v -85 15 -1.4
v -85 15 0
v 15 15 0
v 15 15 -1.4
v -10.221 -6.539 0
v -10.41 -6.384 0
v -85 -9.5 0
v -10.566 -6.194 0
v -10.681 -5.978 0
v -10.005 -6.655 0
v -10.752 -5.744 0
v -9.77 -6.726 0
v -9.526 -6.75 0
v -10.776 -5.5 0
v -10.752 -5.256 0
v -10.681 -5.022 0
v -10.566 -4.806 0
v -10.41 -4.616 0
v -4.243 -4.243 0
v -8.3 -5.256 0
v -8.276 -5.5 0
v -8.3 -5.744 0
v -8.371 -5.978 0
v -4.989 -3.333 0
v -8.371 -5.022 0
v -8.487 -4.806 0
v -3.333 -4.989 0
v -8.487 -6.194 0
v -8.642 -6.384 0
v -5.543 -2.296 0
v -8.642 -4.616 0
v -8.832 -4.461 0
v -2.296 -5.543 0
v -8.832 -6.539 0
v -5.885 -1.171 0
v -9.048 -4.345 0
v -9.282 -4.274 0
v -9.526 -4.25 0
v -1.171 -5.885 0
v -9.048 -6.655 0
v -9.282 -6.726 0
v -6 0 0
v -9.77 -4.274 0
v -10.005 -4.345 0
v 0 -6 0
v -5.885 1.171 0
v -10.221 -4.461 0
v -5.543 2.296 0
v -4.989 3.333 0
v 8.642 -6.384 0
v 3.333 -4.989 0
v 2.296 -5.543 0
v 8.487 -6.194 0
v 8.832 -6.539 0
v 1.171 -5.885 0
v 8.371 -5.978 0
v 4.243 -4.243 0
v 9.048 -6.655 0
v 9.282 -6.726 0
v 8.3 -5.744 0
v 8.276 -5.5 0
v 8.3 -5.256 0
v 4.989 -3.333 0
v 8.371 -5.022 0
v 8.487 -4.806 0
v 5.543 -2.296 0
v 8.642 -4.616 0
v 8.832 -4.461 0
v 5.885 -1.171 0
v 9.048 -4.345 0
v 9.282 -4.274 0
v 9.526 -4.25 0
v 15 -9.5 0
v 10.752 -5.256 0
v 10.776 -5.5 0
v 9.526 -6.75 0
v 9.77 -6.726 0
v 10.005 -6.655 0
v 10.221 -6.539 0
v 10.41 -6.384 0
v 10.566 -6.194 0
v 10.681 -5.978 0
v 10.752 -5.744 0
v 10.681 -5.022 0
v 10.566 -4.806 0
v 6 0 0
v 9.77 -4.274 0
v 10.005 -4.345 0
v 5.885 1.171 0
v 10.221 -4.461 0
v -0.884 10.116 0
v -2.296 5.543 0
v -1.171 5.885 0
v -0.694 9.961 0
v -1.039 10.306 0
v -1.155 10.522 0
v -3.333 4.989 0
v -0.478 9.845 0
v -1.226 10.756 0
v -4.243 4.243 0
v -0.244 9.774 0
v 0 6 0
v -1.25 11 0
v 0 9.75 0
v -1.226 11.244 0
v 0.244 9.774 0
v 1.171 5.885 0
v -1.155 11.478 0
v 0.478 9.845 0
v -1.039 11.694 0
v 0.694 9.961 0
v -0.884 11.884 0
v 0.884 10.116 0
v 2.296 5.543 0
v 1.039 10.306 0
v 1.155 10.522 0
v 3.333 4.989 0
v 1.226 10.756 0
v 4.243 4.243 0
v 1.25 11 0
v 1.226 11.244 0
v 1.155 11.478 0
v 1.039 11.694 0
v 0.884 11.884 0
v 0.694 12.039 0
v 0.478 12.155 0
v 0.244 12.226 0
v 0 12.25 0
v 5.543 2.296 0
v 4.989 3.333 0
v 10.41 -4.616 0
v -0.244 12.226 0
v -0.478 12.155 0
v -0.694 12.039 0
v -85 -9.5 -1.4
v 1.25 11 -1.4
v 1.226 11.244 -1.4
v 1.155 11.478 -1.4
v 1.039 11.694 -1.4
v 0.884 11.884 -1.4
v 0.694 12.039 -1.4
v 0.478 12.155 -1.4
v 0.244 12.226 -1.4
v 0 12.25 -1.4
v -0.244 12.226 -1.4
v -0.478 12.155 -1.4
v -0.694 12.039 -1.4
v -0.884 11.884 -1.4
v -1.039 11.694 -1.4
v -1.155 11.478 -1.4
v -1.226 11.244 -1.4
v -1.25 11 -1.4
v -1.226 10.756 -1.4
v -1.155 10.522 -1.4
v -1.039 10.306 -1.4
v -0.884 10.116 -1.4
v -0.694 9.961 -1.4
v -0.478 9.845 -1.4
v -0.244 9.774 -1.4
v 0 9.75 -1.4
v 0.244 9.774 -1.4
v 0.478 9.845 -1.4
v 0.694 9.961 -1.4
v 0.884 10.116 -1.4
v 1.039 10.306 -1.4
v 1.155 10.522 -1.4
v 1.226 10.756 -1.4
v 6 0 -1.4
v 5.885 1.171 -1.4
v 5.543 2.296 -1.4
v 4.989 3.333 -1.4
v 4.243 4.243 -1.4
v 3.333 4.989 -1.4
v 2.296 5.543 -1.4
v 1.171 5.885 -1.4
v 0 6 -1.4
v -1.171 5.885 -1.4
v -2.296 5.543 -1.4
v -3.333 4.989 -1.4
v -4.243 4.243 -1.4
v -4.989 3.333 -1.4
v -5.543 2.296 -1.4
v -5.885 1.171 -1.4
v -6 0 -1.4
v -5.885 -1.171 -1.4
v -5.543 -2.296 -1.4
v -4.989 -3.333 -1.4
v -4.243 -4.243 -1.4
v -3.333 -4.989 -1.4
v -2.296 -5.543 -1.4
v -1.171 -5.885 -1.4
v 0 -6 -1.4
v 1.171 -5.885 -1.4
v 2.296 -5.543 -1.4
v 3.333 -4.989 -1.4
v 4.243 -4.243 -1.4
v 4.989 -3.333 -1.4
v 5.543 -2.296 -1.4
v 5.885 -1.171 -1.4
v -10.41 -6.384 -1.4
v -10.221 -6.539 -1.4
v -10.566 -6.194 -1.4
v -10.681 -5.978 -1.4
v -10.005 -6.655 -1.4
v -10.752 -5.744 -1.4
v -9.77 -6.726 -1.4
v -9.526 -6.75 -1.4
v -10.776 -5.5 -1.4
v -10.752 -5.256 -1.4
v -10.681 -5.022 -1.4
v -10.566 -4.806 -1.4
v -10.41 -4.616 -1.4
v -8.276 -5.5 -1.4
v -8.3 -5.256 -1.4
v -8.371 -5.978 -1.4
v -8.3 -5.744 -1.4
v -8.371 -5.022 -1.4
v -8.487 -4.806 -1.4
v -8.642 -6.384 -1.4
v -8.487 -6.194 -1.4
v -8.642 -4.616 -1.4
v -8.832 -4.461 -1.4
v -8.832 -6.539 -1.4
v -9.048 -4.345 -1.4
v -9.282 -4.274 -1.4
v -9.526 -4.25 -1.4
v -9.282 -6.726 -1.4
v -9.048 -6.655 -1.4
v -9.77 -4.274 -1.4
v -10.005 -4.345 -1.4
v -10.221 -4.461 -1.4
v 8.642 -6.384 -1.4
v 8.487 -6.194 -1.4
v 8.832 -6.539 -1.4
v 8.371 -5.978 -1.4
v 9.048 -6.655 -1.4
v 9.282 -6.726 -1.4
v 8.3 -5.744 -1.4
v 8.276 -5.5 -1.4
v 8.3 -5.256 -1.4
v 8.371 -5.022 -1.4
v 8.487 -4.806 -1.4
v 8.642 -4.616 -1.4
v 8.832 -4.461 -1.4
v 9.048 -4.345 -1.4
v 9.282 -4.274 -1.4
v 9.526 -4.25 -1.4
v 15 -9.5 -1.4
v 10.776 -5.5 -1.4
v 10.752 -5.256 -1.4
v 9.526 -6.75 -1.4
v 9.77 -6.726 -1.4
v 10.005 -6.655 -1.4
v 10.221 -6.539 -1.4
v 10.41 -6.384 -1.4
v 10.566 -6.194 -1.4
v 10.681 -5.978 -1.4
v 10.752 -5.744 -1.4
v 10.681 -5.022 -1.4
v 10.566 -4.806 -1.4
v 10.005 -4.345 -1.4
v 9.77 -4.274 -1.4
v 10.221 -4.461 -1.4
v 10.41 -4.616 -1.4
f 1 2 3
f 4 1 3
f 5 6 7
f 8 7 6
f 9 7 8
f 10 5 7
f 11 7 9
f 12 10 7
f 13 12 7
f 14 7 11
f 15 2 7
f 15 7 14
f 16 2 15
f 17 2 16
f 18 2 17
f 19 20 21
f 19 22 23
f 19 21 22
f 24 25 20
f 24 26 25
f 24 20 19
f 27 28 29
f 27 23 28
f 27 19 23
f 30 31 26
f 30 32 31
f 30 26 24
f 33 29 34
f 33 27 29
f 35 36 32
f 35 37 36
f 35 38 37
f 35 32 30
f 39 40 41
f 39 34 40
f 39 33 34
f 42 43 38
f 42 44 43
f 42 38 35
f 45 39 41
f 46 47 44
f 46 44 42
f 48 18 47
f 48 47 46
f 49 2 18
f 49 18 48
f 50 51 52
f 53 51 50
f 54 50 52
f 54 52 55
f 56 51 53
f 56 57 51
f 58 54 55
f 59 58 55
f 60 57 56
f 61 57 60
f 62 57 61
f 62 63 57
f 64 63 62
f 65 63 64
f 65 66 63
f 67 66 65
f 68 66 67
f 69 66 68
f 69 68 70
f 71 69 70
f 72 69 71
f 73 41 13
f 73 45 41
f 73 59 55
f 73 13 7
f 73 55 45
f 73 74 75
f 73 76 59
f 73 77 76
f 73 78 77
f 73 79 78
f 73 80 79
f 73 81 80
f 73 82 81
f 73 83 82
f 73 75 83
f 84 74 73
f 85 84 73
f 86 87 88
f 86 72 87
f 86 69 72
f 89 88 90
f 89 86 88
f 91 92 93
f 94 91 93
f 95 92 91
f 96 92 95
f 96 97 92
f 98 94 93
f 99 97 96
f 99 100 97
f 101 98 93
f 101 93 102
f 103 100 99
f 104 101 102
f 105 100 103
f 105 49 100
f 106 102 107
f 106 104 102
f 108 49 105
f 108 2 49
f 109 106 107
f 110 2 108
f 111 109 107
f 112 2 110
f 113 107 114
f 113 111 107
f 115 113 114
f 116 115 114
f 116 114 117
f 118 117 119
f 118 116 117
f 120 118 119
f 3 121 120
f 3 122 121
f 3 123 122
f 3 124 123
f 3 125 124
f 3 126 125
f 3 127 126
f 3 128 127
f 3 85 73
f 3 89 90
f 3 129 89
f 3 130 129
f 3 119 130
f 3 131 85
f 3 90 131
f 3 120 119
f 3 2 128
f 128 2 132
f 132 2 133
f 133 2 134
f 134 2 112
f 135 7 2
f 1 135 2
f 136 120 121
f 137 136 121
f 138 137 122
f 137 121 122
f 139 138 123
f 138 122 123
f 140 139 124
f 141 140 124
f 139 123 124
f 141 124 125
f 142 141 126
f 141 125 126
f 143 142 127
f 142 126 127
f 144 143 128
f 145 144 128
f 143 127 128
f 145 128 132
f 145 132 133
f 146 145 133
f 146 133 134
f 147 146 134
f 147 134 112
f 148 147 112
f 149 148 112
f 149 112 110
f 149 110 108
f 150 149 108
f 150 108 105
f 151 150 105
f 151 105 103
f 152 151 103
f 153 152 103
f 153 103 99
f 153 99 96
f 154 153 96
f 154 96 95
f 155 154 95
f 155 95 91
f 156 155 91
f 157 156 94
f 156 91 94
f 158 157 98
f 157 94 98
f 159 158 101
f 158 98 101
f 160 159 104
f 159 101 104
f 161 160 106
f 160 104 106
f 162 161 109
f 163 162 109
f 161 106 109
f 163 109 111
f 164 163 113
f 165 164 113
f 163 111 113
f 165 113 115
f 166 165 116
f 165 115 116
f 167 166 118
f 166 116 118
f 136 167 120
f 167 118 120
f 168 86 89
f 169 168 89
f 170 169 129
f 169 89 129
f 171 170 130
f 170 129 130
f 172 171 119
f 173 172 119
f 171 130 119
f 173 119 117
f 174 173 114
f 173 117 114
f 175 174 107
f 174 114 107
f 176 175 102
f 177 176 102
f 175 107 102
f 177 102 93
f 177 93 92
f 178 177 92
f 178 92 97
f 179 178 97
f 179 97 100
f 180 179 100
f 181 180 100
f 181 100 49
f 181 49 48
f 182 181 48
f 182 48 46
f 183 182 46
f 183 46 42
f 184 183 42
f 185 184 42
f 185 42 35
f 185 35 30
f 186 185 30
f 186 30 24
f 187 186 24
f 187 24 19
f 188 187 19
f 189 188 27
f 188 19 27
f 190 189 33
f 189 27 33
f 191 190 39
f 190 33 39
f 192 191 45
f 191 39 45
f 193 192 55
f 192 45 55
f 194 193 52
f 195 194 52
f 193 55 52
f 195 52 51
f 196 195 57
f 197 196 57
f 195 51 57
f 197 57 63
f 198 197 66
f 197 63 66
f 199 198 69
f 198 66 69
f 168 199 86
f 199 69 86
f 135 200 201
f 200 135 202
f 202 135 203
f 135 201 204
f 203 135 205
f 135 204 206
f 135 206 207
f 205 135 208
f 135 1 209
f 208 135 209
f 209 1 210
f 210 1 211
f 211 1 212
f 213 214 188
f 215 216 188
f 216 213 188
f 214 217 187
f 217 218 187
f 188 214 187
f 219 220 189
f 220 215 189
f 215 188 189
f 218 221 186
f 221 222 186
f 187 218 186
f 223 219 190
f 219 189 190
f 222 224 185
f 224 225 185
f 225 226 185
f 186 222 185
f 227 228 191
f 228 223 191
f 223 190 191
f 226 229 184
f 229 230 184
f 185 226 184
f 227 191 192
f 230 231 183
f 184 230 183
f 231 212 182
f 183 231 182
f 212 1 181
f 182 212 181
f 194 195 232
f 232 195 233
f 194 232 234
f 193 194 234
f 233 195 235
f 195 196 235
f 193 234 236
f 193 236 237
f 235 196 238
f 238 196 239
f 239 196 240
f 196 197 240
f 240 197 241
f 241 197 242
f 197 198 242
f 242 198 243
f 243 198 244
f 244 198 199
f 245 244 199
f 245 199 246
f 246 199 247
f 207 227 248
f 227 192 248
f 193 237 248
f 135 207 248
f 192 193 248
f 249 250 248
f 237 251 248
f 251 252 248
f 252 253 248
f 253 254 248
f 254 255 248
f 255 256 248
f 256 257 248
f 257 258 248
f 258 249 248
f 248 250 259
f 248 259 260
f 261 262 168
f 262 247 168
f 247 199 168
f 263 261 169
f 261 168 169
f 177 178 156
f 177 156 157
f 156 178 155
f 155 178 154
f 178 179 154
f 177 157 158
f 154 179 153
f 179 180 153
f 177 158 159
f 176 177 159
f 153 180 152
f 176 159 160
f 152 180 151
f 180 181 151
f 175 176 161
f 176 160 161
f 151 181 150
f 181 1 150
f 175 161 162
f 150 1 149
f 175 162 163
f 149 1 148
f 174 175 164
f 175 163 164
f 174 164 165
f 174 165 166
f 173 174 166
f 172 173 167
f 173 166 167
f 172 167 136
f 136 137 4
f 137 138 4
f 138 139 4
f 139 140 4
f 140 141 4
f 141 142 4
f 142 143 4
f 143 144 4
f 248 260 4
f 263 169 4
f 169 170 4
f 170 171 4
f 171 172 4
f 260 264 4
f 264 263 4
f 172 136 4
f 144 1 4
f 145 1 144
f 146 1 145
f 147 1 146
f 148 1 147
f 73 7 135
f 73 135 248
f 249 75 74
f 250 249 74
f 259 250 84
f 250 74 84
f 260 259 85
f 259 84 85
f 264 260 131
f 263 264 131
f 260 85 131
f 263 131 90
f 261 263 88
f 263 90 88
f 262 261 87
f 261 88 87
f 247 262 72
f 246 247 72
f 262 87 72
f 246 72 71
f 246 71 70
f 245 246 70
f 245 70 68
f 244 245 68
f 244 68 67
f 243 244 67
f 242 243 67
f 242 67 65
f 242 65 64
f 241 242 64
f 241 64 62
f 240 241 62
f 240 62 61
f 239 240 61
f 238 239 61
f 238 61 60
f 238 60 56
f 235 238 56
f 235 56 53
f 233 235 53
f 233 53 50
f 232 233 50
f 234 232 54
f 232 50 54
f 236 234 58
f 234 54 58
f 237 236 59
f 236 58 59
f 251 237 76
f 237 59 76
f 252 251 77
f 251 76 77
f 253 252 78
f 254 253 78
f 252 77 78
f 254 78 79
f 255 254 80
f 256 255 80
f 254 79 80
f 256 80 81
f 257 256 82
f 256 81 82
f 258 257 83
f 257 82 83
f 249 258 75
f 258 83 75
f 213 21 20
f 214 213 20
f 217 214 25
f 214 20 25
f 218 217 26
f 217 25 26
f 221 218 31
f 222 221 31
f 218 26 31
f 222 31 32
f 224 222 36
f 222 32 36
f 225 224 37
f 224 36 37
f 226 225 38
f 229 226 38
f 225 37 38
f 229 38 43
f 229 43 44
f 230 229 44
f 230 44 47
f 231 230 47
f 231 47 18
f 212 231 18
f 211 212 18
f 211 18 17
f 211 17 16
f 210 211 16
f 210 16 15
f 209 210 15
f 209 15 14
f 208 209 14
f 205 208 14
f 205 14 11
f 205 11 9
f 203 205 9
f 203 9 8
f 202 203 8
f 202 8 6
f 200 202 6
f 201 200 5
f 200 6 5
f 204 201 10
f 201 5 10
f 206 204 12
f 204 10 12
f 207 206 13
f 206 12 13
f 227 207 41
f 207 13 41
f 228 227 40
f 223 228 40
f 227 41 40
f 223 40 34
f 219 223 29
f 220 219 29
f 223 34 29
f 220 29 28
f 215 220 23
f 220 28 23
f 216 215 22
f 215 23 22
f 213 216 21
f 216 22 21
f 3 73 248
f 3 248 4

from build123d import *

# Parameters (mm, degrees)
SKETCH2_W          = 100
SKETCH2_H          = 24.5
BASE_FLANGE1_DEPTH = 1.4
SKETCH1_R          = 1.25
SKETCH1_R_2        = 6
CUT_EXTRUDE1_DEPTH = 10


# Sheet-metal steps are written as plain solids
with BuildPart() as part:
    # Sketch2 → Base-Flange1 (new body)
    with BuildSketch(Plane.XY):
        with Locations((-35, 2.75)):
            Rectangle(SKETCH2_W, SKETCH2_H)
    extrude(amount=-BASE_FLANGE1_DEPTH)

    # Sketch1 → Cut-Extrude1 (cut)
    with BuildSketch(Plane.XY):
        with Locations((0, 11)):
            Circle(SKETCH1_R)
        with Locations((-9.526279442, -5.5)):
            Circle(SKETCH1_R)
        with Locations((9.526279442, -5.5)):
            Circle(SKETCH1_R)
        Circle(SKETCH1_R_2)
    extrude(amount=-CUT_EXTRUDE1_DEPTH, mode=Mode.SUBTRACT)


solid = part.part
